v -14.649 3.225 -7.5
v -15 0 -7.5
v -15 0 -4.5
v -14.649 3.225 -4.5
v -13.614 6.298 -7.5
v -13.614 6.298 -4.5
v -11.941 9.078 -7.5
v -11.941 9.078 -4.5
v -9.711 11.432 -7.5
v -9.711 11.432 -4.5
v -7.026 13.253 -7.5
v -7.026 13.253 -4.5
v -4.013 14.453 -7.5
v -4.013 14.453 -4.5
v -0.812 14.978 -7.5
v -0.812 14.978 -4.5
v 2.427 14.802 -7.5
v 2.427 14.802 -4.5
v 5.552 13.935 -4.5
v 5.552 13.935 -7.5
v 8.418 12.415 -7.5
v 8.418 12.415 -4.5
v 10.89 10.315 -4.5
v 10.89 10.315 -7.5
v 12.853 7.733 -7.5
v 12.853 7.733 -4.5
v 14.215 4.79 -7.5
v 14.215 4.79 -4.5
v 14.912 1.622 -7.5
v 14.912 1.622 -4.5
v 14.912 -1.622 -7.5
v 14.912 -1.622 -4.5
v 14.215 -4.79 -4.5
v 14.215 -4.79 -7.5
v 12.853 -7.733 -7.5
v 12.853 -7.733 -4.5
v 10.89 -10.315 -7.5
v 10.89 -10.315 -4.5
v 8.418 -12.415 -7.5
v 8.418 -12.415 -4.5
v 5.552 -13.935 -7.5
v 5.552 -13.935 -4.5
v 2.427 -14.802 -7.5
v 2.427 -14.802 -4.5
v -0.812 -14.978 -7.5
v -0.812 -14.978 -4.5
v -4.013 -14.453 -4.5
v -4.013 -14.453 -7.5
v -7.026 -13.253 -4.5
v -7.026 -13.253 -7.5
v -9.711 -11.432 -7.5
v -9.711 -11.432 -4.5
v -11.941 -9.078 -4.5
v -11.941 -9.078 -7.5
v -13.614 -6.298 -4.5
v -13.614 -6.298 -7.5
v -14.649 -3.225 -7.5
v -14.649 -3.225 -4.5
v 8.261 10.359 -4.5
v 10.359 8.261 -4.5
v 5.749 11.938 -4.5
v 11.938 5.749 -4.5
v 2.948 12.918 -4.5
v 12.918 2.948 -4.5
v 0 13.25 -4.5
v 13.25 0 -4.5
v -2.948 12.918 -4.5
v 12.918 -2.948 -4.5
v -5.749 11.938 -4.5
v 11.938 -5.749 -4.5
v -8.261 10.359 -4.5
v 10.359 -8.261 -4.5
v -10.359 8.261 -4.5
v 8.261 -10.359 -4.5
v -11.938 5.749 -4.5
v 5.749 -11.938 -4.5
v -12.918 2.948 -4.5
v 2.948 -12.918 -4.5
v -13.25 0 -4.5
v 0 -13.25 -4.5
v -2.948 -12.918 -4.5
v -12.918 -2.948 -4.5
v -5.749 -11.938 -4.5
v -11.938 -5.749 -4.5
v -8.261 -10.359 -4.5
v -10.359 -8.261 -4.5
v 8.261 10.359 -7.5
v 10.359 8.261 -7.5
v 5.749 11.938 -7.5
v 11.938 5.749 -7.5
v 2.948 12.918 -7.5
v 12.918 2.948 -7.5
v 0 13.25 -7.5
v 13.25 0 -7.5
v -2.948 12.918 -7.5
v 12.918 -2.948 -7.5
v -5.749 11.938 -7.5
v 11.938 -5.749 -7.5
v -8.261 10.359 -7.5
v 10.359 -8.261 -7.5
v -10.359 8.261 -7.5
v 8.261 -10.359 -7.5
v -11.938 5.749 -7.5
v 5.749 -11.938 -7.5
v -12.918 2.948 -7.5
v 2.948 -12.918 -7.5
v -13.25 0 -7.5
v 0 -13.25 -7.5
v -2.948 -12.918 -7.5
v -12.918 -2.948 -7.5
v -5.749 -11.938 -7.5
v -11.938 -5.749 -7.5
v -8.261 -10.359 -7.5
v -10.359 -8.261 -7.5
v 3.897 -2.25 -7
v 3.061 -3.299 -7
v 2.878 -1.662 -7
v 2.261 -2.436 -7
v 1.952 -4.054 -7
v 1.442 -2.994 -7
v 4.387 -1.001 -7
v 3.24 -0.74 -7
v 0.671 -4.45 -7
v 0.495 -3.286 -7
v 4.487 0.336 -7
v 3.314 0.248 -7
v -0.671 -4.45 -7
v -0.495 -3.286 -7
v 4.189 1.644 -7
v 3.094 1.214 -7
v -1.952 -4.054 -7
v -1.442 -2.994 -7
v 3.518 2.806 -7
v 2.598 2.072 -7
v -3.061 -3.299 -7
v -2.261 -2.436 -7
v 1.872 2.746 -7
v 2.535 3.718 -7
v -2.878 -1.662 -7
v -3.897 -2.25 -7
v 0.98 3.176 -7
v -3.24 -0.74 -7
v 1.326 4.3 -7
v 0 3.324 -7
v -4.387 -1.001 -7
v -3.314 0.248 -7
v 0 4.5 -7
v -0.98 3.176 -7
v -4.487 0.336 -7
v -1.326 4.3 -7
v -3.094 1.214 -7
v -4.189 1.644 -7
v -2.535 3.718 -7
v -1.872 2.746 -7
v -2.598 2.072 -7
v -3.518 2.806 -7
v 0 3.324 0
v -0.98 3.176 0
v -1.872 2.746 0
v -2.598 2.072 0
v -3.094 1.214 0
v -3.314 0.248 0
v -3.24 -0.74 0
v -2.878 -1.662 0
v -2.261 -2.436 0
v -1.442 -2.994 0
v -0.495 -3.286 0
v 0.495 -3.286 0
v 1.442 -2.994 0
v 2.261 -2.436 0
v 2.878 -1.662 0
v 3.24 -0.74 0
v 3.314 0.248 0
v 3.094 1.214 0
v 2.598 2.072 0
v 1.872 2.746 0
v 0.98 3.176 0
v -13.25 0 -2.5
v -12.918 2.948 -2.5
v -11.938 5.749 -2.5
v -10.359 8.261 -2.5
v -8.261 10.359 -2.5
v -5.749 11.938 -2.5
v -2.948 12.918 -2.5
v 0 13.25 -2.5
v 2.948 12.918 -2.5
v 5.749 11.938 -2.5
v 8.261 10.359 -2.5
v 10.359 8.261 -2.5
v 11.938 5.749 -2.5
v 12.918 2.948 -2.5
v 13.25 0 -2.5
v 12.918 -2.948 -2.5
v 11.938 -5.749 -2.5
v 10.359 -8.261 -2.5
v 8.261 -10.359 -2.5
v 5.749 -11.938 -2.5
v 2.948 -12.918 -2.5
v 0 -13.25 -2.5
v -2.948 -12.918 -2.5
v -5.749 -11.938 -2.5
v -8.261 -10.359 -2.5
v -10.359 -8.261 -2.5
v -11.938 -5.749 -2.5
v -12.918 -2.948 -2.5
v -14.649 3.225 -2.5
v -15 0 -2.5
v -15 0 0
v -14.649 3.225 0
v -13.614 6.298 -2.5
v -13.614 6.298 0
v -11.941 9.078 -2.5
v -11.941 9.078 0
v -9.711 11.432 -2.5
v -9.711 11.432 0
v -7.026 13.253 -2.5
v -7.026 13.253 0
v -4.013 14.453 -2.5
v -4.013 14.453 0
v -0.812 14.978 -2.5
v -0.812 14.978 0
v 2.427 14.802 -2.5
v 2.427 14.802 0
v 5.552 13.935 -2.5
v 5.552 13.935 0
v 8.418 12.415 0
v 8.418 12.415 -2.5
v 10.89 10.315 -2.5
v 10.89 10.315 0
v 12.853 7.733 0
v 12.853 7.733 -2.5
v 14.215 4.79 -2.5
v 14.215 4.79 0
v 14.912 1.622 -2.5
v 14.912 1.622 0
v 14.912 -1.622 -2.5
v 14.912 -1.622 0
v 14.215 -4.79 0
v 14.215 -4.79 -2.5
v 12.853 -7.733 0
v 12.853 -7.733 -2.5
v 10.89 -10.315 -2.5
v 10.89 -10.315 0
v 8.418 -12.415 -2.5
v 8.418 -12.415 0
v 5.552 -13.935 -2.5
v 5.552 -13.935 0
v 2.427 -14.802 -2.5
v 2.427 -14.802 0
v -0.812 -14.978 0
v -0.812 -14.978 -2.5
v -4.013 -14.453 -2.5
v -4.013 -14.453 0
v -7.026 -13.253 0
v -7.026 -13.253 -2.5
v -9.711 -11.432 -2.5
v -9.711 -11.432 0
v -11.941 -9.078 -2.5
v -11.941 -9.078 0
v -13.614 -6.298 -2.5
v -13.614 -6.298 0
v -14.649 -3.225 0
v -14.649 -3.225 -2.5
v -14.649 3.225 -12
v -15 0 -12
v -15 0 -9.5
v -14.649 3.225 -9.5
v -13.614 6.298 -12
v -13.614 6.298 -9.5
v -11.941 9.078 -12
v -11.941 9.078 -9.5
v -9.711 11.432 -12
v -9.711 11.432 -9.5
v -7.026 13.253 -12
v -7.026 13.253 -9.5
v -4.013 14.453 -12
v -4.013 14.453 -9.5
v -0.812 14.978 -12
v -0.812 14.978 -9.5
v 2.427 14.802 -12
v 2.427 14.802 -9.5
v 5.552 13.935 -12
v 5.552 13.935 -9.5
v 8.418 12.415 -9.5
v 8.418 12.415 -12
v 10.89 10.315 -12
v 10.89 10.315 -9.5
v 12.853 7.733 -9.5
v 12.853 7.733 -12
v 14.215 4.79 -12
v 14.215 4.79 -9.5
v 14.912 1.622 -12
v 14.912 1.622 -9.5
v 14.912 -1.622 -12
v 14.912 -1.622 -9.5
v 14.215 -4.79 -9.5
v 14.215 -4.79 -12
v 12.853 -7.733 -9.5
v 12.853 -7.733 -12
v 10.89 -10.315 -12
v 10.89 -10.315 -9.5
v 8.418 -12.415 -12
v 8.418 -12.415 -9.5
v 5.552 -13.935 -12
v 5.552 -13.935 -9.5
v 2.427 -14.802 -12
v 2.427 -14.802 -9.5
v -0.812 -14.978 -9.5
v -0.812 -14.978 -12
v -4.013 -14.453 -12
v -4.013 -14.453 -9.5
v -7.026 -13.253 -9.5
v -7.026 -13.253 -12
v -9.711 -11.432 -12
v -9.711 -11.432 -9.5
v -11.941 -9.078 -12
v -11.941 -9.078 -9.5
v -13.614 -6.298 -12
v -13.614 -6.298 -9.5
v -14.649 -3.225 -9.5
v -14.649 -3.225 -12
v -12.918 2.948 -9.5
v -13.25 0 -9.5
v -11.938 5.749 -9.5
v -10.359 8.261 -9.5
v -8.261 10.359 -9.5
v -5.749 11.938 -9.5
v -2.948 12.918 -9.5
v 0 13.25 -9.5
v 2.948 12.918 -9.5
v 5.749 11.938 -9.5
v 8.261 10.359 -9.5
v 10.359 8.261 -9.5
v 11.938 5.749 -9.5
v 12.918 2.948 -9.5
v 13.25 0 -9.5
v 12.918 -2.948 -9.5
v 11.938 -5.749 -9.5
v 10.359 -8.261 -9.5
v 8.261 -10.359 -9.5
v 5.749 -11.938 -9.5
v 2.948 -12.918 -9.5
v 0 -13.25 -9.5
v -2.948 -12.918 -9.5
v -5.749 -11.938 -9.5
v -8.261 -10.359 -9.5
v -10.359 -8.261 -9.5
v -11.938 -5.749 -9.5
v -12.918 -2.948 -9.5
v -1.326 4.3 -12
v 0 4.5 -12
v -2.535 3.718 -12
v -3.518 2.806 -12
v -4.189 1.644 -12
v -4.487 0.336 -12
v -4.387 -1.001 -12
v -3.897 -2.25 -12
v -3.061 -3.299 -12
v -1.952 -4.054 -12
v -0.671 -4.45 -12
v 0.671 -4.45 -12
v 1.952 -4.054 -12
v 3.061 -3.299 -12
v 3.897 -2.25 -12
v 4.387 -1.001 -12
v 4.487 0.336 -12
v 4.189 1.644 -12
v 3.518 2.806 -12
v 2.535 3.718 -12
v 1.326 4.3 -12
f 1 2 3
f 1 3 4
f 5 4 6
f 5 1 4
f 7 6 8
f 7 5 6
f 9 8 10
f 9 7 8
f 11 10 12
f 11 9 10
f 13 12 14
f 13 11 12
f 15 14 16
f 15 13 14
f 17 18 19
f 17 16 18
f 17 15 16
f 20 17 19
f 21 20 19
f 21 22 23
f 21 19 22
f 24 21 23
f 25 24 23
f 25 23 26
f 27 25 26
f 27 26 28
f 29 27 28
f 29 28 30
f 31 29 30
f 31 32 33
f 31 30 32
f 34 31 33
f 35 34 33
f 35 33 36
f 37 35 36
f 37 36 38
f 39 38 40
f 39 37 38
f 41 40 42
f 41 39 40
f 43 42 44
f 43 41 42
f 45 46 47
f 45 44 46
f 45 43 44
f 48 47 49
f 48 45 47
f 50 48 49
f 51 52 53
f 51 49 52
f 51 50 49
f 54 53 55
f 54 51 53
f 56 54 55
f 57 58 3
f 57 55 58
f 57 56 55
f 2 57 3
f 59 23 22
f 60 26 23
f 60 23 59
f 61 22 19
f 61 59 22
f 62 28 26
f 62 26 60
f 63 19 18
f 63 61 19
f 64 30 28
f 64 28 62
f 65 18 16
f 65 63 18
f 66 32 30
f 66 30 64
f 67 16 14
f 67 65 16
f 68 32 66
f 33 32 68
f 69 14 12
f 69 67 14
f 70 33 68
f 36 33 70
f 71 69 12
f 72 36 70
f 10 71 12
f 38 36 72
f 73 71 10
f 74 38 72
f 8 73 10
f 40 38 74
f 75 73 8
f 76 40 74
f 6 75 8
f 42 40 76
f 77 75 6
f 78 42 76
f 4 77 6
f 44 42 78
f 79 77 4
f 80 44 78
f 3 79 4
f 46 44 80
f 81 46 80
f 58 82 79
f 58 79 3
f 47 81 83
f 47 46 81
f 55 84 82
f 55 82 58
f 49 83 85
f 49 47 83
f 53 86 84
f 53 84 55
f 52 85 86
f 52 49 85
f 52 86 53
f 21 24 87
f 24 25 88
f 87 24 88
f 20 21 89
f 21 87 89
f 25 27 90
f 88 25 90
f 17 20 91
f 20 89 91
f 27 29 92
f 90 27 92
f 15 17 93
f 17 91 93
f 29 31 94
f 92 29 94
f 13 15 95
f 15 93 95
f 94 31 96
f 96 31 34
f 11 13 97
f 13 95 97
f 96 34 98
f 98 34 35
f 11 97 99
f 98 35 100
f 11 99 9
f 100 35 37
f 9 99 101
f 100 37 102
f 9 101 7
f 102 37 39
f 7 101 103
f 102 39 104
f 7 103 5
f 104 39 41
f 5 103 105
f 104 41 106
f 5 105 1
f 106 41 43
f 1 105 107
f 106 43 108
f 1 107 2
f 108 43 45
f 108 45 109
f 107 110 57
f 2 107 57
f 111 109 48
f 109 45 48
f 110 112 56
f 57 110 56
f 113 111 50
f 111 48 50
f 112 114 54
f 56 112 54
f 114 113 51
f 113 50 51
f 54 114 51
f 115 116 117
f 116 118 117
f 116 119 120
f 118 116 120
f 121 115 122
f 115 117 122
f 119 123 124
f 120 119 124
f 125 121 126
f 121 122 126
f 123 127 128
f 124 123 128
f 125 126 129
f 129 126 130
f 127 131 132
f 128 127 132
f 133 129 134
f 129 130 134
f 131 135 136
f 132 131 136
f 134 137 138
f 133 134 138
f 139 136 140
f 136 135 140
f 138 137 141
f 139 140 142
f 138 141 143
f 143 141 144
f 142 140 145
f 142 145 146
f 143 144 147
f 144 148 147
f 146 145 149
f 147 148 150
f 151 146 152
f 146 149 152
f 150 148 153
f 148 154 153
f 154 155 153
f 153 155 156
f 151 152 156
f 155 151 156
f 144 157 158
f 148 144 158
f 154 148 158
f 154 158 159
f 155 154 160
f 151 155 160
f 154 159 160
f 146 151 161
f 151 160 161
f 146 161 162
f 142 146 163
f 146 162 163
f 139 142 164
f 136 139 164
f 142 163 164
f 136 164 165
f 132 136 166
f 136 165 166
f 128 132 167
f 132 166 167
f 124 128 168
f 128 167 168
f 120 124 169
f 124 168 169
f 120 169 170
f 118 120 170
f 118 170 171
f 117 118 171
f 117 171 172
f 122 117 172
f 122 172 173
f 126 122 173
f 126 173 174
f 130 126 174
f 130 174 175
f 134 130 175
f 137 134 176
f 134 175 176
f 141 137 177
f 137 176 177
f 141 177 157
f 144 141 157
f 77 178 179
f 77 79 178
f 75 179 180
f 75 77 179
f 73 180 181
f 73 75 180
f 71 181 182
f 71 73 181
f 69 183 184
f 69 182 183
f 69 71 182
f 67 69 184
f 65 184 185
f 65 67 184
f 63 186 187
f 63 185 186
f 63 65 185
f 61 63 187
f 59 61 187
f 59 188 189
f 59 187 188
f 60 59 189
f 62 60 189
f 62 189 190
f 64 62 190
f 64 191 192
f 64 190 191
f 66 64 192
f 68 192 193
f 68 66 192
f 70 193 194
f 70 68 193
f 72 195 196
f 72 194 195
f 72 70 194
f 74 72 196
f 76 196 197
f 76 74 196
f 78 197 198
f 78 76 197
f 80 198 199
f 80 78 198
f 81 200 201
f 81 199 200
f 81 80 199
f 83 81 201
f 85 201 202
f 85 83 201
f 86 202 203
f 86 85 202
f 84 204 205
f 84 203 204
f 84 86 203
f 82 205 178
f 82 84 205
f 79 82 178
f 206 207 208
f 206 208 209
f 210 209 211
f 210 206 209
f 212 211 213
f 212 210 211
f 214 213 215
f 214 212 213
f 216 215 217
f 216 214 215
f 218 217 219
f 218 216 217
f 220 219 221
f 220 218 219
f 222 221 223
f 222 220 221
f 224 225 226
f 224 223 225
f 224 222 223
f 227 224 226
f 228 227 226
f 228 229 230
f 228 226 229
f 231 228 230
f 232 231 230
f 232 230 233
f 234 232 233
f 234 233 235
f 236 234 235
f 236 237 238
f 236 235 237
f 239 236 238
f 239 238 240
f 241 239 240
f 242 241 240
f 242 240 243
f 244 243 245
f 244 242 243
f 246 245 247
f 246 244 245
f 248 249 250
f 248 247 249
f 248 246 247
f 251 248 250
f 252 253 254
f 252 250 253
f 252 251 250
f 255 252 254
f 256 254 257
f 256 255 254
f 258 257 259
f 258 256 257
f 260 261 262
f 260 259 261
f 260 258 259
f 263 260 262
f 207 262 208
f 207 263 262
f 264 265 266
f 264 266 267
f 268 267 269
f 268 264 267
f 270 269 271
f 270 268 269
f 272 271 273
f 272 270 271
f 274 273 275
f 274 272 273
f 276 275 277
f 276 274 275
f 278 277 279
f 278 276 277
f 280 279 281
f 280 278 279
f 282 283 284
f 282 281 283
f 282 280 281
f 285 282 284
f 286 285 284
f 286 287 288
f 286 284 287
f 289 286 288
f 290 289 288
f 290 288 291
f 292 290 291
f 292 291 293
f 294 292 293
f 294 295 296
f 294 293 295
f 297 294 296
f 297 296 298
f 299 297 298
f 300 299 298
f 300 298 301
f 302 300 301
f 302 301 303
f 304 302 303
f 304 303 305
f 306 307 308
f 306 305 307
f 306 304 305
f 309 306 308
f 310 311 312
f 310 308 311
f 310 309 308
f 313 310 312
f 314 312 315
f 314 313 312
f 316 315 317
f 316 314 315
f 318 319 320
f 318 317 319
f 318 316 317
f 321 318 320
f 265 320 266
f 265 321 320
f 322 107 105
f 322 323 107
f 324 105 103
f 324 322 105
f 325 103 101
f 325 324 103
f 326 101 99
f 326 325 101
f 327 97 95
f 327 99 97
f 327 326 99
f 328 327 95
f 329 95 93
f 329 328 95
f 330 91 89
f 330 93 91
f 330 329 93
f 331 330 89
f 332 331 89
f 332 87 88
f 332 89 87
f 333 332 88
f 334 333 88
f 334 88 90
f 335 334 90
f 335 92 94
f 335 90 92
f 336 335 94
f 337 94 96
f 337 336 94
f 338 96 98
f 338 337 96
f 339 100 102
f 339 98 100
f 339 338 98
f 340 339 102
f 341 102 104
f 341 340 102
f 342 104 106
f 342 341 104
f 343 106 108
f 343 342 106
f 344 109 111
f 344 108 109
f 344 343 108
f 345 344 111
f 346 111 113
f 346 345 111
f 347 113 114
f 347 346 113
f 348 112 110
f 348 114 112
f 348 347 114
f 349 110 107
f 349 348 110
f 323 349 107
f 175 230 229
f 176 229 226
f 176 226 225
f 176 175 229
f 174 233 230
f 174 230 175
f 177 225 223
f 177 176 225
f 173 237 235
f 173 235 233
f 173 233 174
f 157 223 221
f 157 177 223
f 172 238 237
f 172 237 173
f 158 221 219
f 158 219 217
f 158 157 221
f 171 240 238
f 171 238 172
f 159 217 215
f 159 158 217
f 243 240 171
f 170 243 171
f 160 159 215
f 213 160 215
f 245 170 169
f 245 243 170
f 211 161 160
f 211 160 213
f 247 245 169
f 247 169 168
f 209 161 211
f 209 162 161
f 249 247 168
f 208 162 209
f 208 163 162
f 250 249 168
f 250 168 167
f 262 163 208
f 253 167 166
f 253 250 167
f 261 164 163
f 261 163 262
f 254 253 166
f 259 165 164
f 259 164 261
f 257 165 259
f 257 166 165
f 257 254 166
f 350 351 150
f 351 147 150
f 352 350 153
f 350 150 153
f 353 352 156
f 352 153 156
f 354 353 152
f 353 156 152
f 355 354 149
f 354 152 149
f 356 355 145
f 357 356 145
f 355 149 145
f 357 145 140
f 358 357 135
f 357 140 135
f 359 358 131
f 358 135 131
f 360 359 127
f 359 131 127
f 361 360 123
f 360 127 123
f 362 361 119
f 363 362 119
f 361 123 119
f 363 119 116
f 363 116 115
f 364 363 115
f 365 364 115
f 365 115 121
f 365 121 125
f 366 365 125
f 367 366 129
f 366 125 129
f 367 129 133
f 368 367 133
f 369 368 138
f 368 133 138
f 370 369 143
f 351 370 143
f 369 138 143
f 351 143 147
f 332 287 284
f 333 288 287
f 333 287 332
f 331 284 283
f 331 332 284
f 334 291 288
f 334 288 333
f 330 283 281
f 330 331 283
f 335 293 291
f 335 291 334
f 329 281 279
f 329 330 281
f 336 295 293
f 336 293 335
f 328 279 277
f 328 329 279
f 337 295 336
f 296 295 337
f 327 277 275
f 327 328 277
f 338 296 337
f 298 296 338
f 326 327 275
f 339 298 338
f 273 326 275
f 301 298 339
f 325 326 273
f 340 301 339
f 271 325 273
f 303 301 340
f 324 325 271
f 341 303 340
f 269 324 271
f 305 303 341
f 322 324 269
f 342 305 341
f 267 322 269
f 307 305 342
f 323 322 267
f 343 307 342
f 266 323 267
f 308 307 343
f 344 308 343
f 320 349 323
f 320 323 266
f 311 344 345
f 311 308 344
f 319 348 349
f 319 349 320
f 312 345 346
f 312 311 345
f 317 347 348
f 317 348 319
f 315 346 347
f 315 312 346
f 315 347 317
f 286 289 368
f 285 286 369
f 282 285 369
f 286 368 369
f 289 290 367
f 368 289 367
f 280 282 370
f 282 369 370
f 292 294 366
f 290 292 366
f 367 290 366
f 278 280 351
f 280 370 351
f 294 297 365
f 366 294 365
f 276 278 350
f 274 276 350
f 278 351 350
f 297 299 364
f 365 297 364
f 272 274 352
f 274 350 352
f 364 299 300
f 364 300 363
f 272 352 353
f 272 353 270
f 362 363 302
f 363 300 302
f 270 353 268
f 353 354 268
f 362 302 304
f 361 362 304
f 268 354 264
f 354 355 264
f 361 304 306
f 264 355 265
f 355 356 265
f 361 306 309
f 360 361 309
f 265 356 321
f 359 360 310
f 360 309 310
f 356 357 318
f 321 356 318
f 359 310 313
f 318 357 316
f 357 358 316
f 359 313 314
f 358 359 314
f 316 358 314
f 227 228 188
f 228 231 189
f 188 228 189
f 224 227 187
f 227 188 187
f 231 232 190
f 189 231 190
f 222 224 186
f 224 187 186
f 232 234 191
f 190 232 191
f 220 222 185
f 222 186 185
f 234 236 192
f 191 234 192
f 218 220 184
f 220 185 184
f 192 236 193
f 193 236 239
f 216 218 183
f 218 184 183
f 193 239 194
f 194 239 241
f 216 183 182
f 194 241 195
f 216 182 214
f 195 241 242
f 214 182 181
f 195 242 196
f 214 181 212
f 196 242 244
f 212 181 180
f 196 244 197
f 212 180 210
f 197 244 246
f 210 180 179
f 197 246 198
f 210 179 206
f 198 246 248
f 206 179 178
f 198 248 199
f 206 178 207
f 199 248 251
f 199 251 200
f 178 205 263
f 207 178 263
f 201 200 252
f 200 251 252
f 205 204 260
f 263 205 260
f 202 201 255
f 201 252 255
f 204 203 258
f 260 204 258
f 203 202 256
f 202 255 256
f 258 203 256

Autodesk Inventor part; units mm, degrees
ref_plane "YZ Plane" through (0, 0, 0) normal (1, 0, 0) x (0, 1, 0)
ref_plane "XZ Plane" through (0, 0, 0) normal (0, 1, 0) x (-1, 0, 0)
ref_plane "XY Plane" through (0, 0, 0) normal (0, 0, 1) x (1, 0, 0)
sketch "Sketch1" plane through (0, 0, 0) normal (0, 1, 0) x (-1, 0, 0)
  line L0 (0, 0) -> (15, 0)
  line L1 (15, 0) -> (15, -2.5)
  line L2 (15, -2.5) -> (13.25, -2.5)
  line L3 (13.25, -2.5) -> (13.25, -4.5)
  line L4 (13.25, -4.5) -> (15, -4.5)
  line L5 (15, -4.5) -> (15, -7.5)
  line L6 (15, -7.5) -> (13.25, -7.5)
  line L7 (13.25, -7.5) -> (13.25, -9.5)
  line L8 (13.25, -9.5) -> (15, -9.5)
  line L9 (15, -9.5) -> (15, -12)
  line L10 (15, -12) -> (0, -12)
  line L11 (0, -12) -> (0, 0)
  dimension "d0" = 2.5
  dimension "d2" = 2.5
  dimension "d3" = 2
  dimension "d4" = 2
  dimension "d7" = 12
  dimension "d8" = 26.5
  dimension "d9" = 30
revolve "Revolution1" add sketch "Sketch1" angle 360 about axis through (0, 0, -12) along (0, 0, 1)
sketch "Sketch2" plane through (0, 0, -12) normal (0, 0, -1) x (-1, 0, 0)
  circle A0 centre (0, 0) radius 15 projected
  point P0 (0, 0)
hole "Hole1" at (0, 0, -12) direction (0, 0, 1) diameter 6.647 end through all counterbore diameter 9 counterbore depth 5 thread size "M8x1.25" class "6H" standard "ISO Metric profile"
properties part number "2021"
